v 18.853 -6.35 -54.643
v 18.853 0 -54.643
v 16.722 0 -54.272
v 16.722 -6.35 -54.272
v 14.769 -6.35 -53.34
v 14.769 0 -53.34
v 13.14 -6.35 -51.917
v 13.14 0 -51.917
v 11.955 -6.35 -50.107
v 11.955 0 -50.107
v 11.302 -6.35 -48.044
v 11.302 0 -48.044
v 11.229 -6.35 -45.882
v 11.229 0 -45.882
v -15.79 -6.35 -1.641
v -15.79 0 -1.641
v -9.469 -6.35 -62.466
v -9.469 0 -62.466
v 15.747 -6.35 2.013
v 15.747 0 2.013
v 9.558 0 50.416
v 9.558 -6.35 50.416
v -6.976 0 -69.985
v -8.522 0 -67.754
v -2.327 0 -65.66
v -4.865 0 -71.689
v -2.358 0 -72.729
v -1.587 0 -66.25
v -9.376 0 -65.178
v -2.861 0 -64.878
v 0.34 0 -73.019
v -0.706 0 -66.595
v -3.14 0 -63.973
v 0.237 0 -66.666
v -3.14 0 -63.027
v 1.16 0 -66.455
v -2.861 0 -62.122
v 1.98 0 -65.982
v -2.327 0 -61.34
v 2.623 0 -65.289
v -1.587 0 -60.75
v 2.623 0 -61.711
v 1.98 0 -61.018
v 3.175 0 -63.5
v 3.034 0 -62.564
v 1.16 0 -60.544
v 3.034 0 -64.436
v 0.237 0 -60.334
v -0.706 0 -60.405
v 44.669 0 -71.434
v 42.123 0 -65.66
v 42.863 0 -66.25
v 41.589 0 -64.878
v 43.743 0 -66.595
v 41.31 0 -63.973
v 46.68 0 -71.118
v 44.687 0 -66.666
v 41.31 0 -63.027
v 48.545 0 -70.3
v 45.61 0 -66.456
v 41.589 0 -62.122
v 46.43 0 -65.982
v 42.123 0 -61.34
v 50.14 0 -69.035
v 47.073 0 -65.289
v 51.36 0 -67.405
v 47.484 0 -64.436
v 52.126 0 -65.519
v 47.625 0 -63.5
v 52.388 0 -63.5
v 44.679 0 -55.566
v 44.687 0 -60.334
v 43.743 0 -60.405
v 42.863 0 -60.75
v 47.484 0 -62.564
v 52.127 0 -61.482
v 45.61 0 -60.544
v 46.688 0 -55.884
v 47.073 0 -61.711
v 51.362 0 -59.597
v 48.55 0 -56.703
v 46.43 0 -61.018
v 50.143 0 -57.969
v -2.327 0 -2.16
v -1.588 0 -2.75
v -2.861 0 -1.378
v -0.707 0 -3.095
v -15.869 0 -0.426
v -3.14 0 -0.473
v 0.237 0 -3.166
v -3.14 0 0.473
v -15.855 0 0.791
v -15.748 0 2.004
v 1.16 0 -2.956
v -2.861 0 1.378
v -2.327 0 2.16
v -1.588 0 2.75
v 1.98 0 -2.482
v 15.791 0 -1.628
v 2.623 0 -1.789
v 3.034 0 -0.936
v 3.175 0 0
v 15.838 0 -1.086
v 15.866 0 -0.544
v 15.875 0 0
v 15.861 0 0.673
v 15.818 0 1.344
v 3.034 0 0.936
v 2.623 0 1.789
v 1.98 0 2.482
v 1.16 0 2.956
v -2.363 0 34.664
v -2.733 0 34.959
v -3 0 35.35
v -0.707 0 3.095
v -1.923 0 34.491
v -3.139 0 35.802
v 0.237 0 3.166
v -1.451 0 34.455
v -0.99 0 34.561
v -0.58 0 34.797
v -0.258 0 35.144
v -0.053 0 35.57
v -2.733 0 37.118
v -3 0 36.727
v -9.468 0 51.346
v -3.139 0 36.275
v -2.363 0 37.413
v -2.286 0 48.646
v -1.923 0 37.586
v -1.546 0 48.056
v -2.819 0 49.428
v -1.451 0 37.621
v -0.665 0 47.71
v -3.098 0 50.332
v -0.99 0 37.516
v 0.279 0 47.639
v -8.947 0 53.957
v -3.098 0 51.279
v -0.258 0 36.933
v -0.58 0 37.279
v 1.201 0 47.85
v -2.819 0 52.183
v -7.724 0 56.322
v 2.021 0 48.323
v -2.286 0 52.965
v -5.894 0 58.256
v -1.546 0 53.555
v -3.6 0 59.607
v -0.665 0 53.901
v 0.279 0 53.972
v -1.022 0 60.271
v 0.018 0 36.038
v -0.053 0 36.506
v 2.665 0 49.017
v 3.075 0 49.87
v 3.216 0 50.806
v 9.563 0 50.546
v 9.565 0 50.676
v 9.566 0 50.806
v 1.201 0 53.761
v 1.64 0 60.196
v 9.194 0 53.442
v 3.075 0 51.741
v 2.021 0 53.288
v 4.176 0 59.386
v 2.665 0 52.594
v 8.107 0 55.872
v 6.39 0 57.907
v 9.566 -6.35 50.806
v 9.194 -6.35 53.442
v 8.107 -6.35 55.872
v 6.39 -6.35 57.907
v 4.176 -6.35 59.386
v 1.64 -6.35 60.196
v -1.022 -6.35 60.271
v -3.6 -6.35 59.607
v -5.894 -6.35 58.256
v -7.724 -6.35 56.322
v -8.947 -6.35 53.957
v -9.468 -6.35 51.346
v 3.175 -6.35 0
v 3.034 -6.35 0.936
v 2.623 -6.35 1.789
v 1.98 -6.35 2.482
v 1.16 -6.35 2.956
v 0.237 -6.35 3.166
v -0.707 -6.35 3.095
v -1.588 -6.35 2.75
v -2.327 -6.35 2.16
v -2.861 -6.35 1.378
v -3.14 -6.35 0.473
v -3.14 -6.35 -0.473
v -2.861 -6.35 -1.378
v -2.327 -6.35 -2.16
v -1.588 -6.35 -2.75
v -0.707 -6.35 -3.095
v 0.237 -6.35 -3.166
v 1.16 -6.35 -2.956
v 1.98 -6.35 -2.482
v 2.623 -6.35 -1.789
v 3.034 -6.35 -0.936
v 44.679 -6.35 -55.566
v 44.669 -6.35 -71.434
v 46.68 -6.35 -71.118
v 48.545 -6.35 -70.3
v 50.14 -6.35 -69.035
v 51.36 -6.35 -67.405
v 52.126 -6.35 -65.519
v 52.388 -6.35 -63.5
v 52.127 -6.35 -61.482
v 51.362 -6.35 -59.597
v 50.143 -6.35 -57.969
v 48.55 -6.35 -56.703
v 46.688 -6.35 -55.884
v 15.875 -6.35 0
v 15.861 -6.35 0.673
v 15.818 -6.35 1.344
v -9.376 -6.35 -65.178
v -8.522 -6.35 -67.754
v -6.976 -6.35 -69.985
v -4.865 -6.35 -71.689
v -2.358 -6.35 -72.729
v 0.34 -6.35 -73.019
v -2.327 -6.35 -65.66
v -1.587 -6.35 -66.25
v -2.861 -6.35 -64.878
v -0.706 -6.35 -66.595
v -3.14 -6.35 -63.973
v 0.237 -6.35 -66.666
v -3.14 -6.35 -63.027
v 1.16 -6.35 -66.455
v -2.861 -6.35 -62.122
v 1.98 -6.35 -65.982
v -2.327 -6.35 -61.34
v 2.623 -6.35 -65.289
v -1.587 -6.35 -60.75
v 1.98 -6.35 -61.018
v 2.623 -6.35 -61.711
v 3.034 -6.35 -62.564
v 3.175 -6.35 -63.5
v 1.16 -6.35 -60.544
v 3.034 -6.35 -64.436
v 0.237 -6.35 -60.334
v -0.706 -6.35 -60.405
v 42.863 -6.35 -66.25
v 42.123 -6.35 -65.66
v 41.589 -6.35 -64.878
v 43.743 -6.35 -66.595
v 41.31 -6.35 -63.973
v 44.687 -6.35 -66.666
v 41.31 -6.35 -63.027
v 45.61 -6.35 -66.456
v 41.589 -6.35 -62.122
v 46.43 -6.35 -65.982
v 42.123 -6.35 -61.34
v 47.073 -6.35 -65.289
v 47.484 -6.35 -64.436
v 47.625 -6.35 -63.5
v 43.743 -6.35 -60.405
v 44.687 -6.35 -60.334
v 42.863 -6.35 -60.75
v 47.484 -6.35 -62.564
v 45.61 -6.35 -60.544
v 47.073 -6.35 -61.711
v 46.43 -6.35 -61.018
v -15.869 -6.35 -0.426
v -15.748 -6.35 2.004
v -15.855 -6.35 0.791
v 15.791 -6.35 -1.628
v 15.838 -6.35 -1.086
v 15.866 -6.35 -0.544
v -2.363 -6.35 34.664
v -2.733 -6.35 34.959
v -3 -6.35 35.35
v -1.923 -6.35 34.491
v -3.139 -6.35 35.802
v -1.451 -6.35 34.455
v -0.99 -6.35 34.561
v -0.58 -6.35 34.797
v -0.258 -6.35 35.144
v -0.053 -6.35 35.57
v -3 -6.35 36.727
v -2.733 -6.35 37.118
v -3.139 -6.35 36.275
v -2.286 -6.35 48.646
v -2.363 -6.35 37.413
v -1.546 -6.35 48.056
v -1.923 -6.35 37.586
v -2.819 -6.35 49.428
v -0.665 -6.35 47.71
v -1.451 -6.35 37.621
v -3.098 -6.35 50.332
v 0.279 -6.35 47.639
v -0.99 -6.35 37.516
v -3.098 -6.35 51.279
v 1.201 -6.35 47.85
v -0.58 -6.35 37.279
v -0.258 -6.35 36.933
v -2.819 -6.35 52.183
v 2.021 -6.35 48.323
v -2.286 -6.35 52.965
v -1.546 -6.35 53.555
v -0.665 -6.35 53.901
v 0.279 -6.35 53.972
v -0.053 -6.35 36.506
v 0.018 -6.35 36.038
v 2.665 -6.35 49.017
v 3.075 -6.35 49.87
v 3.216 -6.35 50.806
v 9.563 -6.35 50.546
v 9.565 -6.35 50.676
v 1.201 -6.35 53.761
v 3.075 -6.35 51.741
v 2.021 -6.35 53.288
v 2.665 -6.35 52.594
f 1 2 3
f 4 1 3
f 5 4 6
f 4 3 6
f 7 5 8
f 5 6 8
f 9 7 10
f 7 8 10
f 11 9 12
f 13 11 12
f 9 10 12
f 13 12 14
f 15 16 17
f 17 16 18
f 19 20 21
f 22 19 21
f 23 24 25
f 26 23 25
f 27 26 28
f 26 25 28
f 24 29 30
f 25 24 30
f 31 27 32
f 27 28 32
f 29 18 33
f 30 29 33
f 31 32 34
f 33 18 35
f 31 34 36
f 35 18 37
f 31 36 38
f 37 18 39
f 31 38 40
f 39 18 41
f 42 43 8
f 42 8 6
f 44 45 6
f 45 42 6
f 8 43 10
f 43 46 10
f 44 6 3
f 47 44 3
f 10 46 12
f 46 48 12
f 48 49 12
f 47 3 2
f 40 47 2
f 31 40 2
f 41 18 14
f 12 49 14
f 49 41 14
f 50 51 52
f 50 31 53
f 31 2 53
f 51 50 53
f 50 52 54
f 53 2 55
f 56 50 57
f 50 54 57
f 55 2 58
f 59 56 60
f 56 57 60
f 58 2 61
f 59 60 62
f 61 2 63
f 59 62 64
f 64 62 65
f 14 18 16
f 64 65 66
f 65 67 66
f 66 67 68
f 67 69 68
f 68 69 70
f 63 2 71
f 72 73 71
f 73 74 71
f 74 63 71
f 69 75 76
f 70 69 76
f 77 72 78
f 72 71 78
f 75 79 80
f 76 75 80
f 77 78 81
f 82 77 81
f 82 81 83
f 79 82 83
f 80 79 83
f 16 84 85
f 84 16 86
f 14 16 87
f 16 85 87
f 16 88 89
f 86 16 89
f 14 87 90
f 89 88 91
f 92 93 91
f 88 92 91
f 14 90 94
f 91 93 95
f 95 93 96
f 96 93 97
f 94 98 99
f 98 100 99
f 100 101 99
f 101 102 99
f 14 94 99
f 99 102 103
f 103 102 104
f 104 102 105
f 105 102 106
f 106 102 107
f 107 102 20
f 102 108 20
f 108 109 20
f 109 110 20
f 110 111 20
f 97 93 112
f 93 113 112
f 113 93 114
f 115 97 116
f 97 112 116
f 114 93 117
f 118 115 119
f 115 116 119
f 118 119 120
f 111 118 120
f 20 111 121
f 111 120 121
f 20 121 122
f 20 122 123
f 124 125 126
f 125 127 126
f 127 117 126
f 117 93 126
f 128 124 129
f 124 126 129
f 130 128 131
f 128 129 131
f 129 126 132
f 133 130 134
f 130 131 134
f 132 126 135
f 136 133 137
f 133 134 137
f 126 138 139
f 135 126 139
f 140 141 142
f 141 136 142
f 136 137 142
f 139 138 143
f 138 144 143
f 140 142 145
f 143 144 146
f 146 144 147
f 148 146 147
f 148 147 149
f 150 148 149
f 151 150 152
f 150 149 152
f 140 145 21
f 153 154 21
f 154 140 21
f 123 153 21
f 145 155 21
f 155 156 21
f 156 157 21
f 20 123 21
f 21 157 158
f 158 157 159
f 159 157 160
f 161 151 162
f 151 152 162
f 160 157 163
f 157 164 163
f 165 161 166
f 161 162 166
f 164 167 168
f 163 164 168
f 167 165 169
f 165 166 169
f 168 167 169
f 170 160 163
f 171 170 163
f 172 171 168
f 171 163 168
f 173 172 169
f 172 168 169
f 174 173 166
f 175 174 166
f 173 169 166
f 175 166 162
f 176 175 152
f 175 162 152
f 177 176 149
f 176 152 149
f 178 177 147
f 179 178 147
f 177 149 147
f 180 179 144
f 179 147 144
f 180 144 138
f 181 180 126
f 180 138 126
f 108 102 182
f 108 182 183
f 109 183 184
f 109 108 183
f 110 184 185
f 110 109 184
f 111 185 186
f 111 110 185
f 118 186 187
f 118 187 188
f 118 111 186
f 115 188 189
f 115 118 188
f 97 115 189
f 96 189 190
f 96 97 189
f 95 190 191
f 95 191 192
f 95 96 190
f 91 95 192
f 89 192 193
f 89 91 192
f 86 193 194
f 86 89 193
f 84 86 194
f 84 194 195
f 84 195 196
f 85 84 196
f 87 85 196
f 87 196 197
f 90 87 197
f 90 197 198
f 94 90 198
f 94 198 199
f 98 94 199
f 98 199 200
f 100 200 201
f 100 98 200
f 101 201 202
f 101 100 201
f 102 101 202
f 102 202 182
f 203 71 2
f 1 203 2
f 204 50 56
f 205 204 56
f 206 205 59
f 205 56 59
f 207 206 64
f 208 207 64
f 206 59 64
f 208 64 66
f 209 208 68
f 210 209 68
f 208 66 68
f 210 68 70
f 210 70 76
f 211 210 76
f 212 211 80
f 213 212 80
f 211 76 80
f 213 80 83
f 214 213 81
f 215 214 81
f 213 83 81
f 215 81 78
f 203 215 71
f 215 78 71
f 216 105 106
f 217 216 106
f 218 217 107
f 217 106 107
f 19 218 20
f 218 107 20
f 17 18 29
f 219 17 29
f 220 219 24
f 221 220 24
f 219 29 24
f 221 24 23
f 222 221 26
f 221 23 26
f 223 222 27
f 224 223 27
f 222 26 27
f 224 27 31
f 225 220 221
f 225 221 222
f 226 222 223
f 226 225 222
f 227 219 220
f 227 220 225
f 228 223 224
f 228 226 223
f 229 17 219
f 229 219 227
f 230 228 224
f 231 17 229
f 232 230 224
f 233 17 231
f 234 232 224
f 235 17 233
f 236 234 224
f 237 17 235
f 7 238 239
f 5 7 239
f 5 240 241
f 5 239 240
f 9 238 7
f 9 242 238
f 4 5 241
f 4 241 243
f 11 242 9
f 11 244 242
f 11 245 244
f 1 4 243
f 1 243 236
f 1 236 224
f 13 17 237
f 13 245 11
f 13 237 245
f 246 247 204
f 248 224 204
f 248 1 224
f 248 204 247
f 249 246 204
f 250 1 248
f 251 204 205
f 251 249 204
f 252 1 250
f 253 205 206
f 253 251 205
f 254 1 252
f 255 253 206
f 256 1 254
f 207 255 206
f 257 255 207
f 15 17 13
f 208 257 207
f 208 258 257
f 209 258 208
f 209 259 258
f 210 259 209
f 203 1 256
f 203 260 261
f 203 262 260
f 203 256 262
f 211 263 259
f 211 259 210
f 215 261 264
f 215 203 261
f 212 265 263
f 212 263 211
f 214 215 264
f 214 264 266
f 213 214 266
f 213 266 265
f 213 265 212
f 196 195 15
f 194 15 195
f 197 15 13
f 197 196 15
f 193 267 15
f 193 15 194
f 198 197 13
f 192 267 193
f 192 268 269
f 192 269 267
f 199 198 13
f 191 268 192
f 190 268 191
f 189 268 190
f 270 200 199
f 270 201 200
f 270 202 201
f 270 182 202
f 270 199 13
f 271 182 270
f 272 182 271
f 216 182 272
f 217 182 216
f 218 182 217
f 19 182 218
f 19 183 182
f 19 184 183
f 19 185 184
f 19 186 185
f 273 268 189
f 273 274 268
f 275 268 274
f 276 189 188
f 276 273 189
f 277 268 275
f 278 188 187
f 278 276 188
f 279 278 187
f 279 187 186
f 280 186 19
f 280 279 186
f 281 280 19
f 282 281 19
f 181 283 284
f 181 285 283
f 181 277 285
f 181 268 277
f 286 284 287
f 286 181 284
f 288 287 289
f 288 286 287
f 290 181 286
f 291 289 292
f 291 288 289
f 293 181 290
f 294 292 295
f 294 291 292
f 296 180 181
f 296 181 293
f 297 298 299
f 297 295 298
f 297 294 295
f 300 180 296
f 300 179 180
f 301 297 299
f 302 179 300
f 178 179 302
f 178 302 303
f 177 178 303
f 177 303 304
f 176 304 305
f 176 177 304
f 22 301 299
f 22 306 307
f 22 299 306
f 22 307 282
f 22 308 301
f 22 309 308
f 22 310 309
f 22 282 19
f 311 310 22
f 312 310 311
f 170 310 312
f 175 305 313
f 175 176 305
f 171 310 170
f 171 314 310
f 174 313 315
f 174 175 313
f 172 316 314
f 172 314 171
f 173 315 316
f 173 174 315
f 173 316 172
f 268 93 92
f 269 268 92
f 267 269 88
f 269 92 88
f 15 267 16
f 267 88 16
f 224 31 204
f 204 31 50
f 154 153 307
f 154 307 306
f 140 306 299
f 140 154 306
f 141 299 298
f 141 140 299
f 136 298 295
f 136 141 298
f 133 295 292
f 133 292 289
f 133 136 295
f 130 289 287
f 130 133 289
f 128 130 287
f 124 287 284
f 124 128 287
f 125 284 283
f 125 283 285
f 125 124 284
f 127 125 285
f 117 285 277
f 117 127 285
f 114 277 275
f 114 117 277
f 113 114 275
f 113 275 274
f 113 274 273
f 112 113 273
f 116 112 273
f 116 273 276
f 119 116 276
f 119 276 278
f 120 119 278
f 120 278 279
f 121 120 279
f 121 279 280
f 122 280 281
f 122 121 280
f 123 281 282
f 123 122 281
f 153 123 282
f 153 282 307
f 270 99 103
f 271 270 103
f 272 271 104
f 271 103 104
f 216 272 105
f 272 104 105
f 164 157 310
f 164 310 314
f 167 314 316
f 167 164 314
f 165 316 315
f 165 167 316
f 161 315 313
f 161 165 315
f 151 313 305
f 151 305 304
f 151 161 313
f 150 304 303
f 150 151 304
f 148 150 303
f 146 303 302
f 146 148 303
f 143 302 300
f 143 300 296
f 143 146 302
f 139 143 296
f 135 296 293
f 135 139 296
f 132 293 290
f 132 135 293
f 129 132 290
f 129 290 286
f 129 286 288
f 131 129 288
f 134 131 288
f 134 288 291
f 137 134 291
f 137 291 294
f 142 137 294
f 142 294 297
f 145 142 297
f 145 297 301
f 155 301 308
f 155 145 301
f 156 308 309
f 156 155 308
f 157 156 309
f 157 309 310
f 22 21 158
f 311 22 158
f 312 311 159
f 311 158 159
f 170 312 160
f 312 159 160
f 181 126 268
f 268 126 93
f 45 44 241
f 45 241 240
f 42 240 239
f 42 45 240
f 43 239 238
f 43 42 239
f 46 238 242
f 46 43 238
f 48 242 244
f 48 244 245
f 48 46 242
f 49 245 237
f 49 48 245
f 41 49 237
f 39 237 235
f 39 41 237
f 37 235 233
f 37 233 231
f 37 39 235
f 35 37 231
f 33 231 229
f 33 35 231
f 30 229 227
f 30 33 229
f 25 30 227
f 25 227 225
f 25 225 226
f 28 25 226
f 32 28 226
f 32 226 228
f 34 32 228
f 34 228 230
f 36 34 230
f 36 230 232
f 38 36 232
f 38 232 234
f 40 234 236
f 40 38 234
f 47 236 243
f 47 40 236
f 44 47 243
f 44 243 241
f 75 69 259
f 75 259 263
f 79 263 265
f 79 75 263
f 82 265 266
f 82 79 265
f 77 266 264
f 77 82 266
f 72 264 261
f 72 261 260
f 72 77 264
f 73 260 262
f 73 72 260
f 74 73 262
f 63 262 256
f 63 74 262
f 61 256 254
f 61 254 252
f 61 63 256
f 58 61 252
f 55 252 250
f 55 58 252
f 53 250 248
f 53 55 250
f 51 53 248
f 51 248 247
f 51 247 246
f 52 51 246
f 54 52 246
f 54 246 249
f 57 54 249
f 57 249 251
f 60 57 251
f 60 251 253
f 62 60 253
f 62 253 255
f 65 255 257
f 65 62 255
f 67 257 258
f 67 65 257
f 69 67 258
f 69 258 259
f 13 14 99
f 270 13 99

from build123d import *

# Parameters (mm, degrees)
F0_R     = 3.175
F0_R_2   = 1.5875
F1_DEPTH = 6.35


with BuildPart() as f1:
    # F0 (on Front) → F1 (new body)
    with BuildSketch(Plane.XZ):
        with BuildLine():
            ThreePointArc((0.34024, -73.018883), (6.854439, -70.113772), (9.525014, -63.499961))
            ThreePointArc((9.525014, -63.499961), (0.517595, -53.989034), (-9.468736, -62.46633))
            ThreePointArc((-9.468736, -62.46633), (-6.976488, -69.98487), (0.34024, -73.018883))
        make_face()
        with Locations((1.4e-05, -63.499961)):
            Circle(F0_R, mode=Mode.SUBTRACT)
        with BuildLine():
            ThreePointArc((-9.468736, -62.46633), (0.517595, -53.989034), (9.525014, -63.499961))
            ThreePointArc((9.525014, -63.499961), (6.854439, -70.113772), (0.34024, -73.018883))
            Line((0.34024, -73.018883), (44.669469, -71.434466))
            ThreePointArc((44.669469, -71.434466), (36.512502, -63.495435), (44.678596, -55.565793))
            Line((44.678596, -55.565793), (18.853, -54.642728))
            ThreePointArc((18.853, -54.642728), (13.139918, -51.916888), (11.228697, -45.882259))
            Line((11.228697, -45.882259), (15.791295, -1.62808))
            ThreePointArc((15.791295, -1.62808), (0.006474, -15.874999), (-15.789961, -1.640958))
            Line((-15.789961, -1.640958), (-9.468736, -62.46633))
        make_face()
        with BuildLine():
            ThreePointArc((-15.74798, 2.004183), (-15.873947, 0.182821), (-15.789961, -1.640958))
            ThreePointArc((-15.789961, -1.640958), (0.006474, -15.874999), (15.791295, -1.62808))
            ThreePointArc((15.791295, -1.62808), (15.85406, -0.815115), (15.875, 0))
            ThreePointArc((15.875, 0), (15.842921, 1.008708), (15.746812, 2.013339))
            ThreePointArc((15.746812, 2.013339), (-0.004615, 15.874999), (-15.74798, 2.004183))
        make_face()
        Circle(F0_R, mode=Mode.SUBTRACT)
        with BuildLine():
            ThreePointArc((44.678596, -55.565793), (36.512502, -63.495435), (44.669469, -71.434466))
            ThreePointArc((44.669469, -71.434466), (50.139726, -69.034523), (52.387501, -63.500001))
            ThreePointArc((52.387501, -63.500001), (50.142908, -57.968752), (44.678596, -55.565793))
        make_face()
        with Locations((44.450001, -63.500001)):
            Circle(F0_R, mode=Mode.SUBTRACT)
        with BuildLine():
            Line((-9.468391, 51.346407), (-15.74798, 2.004183))
            ThreePointArc((-15.74798, 2.004183), (-0.004615, 15.874999), (15.746812, 2.013339))
            Line((15.746812, 2.013339), (9.558254, 50.415554))
            ThreePointArc((9.558254, 50.415554), (-0.424197, 41.291985), (-9.468391, 51.346407))
        make_face()
        with Locations((-1.569617, 36.038321)):
            Circle(F0_R_2, mode=Mode.SUBTRACT)
        with BuildLine():
            ThreePointArc((9.566244, 50.805606), (0.311753, 60.326764), (-9.468391, 51.346407))
            ThreePointArc((-9.468391, 51.346407), (-0.424197, 41.291985), (9.558254, 50.415554))
            ThreePointArc((9.558254, 50.415554), (9.564246, 50.610539), (9.566244, 50.805606))
        make_face()
        with Locations((0.041244, 50.805606)):
            Circle(F0_R, mode=Mode.SUBTRACT)
    extrude(amount=F1_DEPTH)


solid = f1.part
